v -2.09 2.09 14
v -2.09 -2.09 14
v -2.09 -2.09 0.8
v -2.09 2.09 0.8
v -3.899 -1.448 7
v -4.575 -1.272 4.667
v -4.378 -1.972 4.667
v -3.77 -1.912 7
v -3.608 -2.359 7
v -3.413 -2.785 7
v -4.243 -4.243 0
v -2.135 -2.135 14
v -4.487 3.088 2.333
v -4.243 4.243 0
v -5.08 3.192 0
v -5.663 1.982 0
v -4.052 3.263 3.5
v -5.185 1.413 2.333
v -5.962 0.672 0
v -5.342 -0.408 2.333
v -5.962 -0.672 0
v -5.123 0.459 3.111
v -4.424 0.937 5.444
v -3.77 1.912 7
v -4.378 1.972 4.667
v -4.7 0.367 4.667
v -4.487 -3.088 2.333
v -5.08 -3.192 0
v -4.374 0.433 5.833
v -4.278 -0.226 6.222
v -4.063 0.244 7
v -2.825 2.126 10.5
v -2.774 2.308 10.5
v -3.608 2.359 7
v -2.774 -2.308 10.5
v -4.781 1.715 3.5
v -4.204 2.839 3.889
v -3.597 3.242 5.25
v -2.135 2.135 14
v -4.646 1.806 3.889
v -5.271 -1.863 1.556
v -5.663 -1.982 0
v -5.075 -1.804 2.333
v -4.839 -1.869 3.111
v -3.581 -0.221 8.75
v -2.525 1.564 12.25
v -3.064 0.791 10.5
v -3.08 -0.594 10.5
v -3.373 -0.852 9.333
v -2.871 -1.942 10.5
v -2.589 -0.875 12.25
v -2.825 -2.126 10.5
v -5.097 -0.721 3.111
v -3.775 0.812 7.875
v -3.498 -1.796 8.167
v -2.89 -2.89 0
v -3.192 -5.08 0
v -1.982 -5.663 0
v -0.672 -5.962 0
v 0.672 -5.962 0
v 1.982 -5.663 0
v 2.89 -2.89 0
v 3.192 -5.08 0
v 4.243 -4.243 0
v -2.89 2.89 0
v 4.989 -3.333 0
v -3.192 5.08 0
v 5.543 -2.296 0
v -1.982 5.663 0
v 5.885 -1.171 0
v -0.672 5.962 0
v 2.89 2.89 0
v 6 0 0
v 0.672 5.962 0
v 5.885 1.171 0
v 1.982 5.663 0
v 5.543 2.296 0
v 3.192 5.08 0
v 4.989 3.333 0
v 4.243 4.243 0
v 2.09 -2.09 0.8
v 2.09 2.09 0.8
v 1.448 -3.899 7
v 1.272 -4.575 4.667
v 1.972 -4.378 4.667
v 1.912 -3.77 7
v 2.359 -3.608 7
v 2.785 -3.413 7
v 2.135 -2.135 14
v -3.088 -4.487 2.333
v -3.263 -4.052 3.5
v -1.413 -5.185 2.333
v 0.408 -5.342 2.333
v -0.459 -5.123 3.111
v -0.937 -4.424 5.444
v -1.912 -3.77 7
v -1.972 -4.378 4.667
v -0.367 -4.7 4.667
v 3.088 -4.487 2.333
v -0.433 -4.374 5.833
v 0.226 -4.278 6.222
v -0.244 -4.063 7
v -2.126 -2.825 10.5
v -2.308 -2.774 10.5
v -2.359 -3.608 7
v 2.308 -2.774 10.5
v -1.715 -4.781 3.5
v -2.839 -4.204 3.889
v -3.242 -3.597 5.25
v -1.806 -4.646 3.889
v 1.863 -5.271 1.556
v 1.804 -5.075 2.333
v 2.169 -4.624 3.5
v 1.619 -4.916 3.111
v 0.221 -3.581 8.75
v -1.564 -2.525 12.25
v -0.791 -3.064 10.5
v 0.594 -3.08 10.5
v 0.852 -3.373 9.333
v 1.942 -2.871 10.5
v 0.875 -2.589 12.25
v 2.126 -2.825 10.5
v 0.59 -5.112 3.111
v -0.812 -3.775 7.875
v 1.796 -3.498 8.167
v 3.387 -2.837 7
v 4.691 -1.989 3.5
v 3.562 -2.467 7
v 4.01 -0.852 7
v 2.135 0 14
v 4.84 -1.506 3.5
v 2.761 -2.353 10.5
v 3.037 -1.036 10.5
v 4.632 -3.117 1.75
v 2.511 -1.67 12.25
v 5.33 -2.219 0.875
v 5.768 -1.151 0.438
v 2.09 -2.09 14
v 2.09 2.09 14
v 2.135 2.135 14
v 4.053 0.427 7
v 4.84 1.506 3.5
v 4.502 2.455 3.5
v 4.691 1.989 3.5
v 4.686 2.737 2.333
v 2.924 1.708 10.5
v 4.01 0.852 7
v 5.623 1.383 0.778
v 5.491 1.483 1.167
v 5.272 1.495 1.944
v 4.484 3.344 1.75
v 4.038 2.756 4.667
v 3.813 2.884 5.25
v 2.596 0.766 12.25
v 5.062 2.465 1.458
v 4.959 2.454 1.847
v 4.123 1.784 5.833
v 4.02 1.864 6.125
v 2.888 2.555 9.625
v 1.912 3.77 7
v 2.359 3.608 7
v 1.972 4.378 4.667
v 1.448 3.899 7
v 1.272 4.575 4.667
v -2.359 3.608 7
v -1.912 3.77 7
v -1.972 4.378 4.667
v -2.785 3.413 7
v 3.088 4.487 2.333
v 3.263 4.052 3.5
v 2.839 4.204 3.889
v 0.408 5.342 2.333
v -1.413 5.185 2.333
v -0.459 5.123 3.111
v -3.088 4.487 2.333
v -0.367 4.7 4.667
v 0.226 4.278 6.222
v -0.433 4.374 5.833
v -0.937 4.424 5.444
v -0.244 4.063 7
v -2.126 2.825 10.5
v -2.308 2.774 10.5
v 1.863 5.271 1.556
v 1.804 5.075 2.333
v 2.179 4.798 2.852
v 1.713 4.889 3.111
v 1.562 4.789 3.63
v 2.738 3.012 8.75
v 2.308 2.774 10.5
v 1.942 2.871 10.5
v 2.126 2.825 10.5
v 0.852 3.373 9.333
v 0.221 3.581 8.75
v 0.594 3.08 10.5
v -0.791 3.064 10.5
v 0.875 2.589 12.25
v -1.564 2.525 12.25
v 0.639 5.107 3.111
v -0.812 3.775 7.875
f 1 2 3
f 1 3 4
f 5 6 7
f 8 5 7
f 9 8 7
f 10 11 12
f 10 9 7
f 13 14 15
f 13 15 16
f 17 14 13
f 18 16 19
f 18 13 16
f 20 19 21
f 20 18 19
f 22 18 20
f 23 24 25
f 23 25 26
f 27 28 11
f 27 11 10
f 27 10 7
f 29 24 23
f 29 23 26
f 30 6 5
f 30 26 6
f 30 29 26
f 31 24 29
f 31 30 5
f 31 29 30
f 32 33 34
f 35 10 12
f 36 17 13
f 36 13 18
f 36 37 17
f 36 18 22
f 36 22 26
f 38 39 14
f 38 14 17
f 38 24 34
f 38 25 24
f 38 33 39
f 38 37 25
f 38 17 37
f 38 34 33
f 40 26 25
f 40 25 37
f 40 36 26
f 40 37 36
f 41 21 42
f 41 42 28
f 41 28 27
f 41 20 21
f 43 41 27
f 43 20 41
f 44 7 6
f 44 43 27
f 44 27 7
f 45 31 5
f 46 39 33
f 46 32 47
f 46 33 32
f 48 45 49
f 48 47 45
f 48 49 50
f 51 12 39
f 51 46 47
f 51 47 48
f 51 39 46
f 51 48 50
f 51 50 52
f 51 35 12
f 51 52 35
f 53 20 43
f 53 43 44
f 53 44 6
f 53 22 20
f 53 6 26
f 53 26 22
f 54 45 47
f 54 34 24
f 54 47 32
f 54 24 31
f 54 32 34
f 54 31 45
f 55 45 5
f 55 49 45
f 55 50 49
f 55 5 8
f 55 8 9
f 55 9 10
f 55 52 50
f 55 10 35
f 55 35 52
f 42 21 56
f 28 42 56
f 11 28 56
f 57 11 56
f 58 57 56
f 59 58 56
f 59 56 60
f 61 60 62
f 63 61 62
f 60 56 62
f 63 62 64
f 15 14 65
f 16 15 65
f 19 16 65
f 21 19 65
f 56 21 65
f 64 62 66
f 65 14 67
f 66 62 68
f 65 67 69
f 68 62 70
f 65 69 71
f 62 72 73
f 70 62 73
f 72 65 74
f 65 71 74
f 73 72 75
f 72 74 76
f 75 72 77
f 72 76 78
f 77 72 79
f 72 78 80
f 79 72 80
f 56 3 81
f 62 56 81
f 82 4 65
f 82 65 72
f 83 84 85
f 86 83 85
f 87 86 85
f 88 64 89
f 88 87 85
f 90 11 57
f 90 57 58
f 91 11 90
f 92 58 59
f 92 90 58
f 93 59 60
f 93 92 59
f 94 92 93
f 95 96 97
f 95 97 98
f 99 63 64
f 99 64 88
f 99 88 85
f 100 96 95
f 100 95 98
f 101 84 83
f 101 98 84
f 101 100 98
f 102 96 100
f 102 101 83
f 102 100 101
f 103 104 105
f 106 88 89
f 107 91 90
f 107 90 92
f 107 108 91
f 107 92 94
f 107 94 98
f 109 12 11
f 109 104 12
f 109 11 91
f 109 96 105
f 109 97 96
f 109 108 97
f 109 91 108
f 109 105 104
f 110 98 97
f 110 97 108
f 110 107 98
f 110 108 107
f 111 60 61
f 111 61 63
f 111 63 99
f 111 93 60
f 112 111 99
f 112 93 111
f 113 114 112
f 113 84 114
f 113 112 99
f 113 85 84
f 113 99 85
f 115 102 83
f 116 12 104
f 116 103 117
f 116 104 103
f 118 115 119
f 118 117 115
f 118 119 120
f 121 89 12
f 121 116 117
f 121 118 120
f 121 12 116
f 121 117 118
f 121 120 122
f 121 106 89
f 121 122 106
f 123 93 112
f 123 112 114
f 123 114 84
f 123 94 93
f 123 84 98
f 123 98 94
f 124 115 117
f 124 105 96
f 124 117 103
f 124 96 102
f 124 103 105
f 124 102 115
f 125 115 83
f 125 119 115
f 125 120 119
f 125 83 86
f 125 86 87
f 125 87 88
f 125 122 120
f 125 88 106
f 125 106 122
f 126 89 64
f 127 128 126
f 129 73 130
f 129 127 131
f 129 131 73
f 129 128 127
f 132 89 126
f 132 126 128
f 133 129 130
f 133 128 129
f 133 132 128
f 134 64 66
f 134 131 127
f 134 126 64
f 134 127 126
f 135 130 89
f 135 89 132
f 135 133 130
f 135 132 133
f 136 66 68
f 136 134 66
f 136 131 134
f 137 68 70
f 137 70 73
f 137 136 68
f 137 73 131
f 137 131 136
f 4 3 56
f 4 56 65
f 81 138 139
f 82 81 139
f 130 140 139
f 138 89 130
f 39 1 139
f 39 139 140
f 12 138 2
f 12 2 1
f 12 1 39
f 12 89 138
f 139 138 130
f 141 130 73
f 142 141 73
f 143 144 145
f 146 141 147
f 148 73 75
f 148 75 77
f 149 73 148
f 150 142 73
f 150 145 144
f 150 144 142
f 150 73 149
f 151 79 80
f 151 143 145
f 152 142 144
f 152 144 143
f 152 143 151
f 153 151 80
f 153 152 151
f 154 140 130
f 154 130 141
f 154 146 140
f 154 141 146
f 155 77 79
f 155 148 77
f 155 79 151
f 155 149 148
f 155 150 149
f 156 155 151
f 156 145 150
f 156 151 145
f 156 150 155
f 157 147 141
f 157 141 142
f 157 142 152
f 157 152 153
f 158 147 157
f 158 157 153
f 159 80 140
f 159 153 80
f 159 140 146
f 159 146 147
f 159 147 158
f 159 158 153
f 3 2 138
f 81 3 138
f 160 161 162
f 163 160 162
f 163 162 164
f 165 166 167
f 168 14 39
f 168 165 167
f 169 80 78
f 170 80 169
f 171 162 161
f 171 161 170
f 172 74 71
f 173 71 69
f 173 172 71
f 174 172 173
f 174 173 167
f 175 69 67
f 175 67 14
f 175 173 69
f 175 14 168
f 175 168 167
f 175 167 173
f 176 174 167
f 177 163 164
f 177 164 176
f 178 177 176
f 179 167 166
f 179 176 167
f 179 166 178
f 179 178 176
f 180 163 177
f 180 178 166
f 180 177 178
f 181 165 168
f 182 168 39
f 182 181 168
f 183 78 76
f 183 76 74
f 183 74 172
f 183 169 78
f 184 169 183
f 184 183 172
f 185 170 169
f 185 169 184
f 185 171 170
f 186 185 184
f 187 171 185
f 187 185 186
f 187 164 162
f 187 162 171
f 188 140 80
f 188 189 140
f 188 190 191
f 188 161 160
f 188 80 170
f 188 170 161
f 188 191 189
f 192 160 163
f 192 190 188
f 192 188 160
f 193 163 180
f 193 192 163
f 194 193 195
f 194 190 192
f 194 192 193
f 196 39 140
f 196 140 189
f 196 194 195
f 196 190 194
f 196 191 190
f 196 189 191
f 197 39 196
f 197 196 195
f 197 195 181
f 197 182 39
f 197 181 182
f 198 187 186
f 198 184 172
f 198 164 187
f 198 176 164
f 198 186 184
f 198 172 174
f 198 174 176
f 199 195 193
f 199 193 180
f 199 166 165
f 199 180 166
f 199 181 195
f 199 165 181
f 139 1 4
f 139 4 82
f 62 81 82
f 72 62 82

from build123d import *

# Parameters (mm, degrees)
F0_R     = 6
F2_W     = 4.27
F2_H     = 4.27
F4_W     = 4.18
F4_H     = 4.18
F5_DEPTH = 25
F6_SIZE2 = 0.8
F6_SIZE  = 0.8


with BuildPart() as f3:
    # F0 (on Top) → F3 section 0
    with BuildSketch(Plane.XY):
        Circle(F0_R)
    # F2 (on offset) → F3 section 1
    with BuildSketch(Plane.XY.offset(14)):
        Rectangle(F2_W, F2_H)
    loft()

    # F4 (on face) → F5 (cut)
    with BuildSketch(Plane.XY.offset(14)):
        Rectangle(F4_W, F4_H)
    extrude(amount=-F5_DEPTH, mode=Mode.SUBTRACT)

    # F6
    f6_edges = [f3.edges().sort_by_distance(p)[0] for p in [
        (-2.09, 0, 0),
        (0, -2.09, 0),
        (2.09, 0, 0),
        (0, 2.09, 0),
    ]]
    chamfer(f6_edges, length=F6_SIZE, length2=F6_SIZE2)


solid = f3.part
